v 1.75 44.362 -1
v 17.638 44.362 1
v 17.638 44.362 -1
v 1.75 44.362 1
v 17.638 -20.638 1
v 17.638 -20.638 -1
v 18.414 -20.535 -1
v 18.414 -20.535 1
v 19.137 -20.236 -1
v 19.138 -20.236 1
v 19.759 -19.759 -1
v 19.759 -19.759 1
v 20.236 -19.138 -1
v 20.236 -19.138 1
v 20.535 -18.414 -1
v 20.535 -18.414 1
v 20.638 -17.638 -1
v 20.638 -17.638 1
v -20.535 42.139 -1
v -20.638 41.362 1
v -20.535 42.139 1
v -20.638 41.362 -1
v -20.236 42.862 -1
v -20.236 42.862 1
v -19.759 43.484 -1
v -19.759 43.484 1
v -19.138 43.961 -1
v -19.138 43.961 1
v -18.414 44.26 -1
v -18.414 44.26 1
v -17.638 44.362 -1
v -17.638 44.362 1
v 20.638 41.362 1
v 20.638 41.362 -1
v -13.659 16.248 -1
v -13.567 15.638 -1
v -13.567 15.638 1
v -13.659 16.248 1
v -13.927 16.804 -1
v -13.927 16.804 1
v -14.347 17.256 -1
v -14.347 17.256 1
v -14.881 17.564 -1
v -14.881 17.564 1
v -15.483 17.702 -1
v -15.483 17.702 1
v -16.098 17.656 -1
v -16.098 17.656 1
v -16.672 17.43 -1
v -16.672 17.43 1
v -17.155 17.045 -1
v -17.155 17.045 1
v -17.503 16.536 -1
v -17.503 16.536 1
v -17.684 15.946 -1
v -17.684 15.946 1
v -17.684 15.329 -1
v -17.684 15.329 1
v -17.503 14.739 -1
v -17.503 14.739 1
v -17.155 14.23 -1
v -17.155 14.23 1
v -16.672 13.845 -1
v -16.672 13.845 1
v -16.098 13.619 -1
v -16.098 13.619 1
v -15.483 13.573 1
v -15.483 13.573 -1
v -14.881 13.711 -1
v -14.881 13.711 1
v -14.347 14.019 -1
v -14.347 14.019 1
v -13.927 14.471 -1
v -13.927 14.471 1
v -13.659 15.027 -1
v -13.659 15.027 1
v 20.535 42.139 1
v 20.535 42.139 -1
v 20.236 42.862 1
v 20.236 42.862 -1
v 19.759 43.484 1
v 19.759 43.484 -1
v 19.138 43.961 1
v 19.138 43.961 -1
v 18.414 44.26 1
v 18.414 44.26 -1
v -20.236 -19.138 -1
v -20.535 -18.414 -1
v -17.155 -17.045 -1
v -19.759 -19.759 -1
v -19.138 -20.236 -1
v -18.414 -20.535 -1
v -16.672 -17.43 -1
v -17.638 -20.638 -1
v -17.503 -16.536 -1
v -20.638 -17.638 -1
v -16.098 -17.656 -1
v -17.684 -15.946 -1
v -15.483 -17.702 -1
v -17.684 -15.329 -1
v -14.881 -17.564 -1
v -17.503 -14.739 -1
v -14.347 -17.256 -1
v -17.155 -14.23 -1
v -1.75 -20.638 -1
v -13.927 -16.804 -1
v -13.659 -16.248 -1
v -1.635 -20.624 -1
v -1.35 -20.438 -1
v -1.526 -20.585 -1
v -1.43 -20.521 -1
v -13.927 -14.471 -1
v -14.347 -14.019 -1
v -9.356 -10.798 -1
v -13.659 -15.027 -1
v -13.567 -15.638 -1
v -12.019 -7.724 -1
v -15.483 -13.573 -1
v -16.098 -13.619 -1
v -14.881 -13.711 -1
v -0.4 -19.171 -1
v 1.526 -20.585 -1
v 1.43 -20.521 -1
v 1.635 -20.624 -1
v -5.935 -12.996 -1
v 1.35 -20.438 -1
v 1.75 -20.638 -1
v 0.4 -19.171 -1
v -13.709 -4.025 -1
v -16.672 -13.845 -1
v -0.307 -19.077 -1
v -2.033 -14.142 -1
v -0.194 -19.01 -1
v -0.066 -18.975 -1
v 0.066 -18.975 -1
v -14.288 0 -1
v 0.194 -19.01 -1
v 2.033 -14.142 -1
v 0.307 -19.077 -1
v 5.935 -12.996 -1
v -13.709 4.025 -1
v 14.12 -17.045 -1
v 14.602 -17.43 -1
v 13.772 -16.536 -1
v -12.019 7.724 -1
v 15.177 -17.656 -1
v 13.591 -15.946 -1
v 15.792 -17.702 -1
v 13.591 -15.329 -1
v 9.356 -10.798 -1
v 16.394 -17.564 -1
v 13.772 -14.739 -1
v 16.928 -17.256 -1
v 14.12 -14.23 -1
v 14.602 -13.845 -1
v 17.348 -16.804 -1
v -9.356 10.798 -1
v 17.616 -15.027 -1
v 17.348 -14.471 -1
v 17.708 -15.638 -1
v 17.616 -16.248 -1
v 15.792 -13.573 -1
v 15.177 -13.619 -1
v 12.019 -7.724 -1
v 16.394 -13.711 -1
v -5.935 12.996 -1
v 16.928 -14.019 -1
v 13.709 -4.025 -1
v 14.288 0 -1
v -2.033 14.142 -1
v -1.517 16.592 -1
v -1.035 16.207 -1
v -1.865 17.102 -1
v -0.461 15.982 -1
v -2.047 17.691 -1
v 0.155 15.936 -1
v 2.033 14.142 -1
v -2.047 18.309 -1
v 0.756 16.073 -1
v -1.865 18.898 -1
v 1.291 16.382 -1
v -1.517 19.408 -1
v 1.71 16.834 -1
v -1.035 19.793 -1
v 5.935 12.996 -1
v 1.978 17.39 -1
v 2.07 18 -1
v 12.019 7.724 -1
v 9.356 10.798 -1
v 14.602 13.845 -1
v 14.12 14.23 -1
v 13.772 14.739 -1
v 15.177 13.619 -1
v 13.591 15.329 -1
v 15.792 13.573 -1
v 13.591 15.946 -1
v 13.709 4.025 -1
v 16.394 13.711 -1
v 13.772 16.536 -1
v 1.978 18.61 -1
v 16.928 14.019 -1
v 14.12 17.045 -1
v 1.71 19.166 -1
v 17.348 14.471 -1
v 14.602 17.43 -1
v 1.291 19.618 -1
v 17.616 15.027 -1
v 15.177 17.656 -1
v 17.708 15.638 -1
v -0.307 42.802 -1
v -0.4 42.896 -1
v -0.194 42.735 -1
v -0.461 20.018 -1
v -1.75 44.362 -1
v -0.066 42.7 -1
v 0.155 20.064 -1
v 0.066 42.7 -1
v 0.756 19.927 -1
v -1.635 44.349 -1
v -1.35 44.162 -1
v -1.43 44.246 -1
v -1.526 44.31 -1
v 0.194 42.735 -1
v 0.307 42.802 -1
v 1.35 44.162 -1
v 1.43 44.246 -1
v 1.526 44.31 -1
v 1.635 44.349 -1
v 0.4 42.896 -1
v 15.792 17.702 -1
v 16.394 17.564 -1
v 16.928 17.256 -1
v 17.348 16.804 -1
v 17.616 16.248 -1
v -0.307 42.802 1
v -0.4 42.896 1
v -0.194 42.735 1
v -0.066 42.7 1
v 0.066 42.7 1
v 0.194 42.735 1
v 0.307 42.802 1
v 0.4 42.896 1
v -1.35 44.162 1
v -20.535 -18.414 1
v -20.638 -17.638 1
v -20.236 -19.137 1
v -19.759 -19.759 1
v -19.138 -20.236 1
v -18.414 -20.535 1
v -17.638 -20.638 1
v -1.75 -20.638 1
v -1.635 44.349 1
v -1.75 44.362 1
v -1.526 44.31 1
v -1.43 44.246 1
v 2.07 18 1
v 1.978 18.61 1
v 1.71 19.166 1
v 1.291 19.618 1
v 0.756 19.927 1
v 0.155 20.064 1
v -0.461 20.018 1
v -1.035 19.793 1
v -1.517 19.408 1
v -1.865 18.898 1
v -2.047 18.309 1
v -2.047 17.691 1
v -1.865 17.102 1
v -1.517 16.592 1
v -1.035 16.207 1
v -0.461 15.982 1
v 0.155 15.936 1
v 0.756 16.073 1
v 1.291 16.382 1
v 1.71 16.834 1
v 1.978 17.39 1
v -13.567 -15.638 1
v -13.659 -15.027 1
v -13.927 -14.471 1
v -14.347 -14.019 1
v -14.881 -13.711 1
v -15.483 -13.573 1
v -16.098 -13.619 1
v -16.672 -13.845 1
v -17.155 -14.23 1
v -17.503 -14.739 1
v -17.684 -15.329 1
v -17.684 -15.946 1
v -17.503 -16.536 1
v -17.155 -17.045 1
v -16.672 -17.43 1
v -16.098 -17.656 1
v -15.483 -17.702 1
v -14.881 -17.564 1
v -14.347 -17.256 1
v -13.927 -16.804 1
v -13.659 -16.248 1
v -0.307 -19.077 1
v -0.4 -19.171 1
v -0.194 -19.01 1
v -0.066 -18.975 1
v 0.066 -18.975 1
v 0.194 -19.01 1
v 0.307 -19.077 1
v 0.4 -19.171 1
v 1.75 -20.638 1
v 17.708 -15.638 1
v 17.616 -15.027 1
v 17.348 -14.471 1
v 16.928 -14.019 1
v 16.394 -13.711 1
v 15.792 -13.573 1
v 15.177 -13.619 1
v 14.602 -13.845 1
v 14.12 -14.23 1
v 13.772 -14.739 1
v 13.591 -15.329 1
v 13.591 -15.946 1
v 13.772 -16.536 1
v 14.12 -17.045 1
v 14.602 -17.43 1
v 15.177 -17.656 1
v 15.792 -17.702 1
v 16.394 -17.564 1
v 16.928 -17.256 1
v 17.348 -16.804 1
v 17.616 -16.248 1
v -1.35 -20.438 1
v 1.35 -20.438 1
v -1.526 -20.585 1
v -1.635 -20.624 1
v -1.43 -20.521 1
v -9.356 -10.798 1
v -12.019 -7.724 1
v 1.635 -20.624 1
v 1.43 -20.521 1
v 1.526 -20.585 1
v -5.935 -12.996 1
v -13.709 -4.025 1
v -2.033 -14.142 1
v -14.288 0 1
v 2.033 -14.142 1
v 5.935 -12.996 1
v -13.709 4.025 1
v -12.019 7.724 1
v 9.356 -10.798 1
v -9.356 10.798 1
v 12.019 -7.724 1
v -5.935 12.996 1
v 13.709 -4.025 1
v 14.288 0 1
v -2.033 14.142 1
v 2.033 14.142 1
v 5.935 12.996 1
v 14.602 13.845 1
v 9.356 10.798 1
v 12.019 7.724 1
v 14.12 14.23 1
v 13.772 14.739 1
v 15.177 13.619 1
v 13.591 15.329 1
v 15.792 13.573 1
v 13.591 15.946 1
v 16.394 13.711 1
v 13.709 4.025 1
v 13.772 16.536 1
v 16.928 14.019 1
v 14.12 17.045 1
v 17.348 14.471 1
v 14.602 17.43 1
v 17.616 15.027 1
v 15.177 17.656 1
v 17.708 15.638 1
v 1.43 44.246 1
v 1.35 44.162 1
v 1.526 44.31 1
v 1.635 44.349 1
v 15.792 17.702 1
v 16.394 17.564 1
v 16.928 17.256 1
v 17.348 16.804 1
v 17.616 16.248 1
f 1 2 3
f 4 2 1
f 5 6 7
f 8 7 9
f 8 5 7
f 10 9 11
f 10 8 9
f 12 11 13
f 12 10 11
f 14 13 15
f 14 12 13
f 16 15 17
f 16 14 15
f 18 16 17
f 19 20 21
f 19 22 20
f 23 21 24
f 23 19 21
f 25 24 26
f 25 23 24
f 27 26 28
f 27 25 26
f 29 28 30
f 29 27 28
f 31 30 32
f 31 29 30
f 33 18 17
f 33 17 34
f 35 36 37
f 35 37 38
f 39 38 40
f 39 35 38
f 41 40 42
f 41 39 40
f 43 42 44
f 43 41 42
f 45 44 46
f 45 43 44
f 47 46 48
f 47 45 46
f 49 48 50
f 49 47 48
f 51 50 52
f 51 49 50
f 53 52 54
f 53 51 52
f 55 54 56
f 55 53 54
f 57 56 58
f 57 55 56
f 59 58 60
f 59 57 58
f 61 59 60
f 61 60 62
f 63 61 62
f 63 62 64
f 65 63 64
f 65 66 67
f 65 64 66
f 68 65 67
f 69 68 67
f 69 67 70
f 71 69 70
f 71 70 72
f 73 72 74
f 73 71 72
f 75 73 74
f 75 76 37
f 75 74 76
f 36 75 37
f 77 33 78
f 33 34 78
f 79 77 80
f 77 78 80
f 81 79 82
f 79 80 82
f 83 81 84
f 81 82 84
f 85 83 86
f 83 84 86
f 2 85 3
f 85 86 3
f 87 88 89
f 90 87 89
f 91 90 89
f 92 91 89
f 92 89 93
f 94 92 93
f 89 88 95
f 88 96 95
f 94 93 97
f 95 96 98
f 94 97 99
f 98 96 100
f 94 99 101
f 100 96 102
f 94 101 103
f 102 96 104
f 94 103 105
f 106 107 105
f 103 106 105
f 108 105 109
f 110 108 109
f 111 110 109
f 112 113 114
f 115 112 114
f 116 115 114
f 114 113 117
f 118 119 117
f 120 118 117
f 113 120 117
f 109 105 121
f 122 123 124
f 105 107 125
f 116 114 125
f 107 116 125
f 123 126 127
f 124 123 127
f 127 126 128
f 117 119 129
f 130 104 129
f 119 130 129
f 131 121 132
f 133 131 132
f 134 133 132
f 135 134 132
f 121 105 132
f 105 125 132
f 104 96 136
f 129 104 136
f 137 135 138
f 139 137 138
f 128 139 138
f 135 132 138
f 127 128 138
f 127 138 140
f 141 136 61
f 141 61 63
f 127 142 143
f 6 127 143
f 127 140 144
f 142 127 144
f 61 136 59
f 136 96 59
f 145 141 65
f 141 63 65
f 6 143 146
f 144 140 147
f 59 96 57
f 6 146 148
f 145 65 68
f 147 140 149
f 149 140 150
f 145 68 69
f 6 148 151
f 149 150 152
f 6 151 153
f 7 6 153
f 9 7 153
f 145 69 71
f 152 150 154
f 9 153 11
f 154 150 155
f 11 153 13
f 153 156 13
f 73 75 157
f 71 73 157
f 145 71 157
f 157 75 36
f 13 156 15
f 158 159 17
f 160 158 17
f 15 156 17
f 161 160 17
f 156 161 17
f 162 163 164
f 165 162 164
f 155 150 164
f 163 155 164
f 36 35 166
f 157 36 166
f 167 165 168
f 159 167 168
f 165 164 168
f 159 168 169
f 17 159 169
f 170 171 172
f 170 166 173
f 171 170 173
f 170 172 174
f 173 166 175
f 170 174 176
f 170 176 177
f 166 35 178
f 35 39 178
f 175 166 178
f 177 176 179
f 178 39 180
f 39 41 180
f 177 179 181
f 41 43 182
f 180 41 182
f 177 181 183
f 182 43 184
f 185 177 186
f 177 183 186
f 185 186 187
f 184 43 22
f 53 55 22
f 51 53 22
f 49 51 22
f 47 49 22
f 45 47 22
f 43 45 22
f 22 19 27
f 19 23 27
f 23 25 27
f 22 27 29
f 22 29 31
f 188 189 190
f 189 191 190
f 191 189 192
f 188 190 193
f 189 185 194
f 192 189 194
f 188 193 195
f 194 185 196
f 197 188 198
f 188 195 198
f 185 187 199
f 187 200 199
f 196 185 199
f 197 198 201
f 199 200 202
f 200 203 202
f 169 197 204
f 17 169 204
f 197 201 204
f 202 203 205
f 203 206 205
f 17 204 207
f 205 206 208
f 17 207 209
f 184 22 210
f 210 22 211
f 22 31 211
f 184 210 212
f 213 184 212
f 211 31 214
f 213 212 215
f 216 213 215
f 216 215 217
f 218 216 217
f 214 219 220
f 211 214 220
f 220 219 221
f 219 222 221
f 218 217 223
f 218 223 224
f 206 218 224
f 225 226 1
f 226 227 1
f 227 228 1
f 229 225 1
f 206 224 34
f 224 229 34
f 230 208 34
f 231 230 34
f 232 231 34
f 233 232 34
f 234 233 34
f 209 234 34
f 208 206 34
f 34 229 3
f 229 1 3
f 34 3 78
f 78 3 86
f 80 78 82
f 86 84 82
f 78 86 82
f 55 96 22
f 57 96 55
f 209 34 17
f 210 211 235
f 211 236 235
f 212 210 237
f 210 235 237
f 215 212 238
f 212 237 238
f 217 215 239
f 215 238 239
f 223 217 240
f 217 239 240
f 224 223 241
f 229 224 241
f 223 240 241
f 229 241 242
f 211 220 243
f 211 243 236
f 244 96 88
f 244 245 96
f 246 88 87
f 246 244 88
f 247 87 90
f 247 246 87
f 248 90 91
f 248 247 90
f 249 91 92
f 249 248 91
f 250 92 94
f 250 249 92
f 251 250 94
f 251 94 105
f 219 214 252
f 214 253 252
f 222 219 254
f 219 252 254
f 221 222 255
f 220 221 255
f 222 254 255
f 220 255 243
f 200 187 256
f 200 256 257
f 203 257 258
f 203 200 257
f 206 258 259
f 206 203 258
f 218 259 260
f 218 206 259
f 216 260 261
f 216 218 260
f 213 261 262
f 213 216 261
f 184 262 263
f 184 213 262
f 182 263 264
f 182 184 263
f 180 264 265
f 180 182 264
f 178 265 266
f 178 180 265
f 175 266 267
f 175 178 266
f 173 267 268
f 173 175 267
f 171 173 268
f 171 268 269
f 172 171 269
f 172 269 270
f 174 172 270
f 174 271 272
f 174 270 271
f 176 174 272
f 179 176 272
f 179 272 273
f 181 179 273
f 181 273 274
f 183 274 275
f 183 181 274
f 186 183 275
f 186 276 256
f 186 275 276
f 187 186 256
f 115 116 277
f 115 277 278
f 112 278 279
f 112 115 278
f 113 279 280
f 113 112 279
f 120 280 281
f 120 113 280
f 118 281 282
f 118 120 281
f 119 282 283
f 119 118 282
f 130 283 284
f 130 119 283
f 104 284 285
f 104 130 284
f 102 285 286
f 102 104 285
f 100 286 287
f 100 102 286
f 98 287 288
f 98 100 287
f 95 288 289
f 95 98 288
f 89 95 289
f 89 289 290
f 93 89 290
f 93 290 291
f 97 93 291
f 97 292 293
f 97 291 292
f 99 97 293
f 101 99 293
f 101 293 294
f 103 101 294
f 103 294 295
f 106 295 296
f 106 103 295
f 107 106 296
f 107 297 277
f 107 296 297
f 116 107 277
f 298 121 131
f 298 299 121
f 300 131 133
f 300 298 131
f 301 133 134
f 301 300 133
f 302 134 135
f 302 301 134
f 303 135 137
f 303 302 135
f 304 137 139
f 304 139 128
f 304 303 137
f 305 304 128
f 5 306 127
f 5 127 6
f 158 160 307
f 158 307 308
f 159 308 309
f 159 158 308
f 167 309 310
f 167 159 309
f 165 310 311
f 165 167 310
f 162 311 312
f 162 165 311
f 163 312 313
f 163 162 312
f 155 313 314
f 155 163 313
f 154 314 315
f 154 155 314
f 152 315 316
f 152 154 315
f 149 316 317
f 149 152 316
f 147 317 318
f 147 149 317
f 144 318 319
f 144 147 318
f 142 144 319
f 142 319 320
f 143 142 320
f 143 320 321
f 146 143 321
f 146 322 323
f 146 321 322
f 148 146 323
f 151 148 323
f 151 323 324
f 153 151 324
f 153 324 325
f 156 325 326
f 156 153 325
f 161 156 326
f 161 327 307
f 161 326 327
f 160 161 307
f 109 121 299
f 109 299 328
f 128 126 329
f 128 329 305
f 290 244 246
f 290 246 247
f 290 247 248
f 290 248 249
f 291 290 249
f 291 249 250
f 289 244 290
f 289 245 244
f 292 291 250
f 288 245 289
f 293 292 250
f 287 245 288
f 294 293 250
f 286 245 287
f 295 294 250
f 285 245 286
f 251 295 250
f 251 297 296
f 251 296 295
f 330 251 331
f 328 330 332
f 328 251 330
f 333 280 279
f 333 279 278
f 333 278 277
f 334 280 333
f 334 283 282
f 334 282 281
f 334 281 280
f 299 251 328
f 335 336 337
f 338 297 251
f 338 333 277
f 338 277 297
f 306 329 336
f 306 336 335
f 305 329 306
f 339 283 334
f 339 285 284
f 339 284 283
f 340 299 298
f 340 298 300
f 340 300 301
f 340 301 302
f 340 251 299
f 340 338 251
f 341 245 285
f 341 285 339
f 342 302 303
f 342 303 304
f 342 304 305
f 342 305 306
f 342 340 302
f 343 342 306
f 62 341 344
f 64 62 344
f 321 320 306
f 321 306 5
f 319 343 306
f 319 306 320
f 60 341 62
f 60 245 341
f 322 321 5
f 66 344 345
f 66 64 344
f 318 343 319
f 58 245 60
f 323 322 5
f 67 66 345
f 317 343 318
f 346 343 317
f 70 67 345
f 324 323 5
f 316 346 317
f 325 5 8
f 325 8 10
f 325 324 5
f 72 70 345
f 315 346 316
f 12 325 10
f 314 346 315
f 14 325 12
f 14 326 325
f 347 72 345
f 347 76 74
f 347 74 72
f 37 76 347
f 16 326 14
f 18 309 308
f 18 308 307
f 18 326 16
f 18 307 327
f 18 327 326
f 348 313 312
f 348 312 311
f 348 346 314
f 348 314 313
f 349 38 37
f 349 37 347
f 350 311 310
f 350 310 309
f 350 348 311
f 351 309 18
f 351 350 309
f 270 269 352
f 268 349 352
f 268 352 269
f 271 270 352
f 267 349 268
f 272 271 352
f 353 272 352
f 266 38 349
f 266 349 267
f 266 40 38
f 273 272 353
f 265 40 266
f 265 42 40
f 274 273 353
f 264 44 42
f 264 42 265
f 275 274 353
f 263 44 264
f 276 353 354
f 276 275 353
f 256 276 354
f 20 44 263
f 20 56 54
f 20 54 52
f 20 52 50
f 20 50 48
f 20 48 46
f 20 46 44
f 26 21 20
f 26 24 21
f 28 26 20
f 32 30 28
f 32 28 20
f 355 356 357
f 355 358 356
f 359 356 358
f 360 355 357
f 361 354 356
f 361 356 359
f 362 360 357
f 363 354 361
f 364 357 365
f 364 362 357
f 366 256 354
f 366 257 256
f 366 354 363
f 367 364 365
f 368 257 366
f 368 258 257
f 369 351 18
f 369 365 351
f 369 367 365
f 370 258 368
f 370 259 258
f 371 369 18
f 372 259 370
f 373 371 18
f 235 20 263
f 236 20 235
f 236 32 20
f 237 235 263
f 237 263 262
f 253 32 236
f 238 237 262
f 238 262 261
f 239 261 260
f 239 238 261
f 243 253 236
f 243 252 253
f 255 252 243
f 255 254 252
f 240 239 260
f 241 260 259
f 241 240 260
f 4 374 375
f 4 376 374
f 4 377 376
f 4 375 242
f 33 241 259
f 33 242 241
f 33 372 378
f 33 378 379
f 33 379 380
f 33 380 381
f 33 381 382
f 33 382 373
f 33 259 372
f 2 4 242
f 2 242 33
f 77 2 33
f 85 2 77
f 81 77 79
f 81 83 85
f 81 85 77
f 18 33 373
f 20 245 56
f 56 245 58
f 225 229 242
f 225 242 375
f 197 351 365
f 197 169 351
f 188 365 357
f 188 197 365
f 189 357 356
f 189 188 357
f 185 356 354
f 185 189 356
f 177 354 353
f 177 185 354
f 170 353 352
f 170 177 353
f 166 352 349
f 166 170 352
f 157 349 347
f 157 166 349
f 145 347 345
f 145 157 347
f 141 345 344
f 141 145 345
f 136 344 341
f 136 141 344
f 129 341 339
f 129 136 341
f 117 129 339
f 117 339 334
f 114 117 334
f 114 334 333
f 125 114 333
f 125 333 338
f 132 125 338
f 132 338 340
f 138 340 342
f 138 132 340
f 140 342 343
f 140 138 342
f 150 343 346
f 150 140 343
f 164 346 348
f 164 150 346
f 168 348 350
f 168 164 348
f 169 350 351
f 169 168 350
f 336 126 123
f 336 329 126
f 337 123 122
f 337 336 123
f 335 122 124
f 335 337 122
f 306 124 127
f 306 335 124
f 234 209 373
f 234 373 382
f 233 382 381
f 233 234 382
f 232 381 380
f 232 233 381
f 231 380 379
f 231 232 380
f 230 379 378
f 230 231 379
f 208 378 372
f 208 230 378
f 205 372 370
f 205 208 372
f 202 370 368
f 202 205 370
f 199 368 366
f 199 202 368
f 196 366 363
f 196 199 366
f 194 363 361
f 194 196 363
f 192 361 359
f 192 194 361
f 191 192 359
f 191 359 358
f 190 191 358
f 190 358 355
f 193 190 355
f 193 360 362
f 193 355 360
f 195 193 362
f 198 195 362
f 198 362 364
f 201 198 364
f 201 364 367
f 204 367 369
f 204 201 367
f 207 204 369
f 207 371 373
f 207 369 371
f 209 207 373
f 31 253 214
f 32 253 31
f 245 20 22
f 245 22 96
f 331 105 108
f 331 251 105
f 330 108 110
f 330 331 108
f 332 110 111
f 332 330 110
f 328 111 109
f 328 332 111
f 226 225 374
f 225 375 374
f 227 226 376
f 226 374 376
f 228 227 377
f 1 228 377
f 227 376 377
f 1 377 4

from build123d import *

# Parameters (mm, degrees)
SKETCH2_R               = 20.6375
SKETCH2_R_2             = 14.2875
BOSS_EXTRUDE1_DEPTH     = 1
CUT_EXTRUDE1_DEPTH      = 49.96874322
CUT_EXTRUDE1_DEPTH_BACK = 49.96874322
SKETCH3_R               = 2.07
FILLET1_R               = 3
FILLET3_R               = 0.5


with BuildPart() as part:
    # Sketch2 → Boss-Extrude1 (new, symmetric)
    # profile 1 of 4: a face of its own
    with BuildSketch(Plane.XY):
        Circle(SKETCH2_R)
        Circle(SKETCH2_R_2, mode=Mode.SUBTRACT)
    # profile 2 of 4: a face of its own
    with BuildSketch(Plane.XY):
        with BuildLine():
            Line((-20.6375, 44.3625), (-20.6375, 0))
            ThreePointArc((-20.6375, 0), (0, 20.6375), (20.6375, 0))
            Line((20.6375, 0), (20.6375, 44.3625))
            Line((20.6375, 44.3625), (-20.6375, 44.3625))
        make_face()
    # profile 3 of 4: a face of its own
    with BuildSketch(Plane.XY):
        with BuildLine():
            ThreePointArc((20.6375, 0), (14.592916166, -14.592916227), (-8.6e-08, -20.6375))
            Line((-8.6e-08, -20.6375), (20.6375, -20.6375))
            Line((20.6375, -20.6375), (20.6375, 0))
        make_face()
    # profile 4 of 4: a face of its own
    with BuildSketch(Plane.XY):
        with BuildLine():
            Line((-20.6375, 0), (-20.6375, -20.6375))
            Line((-20.6375, -20.6375), (-8.6e-08, -20.6375))
            ThreePointArc((-8.6e-08, -20.6375), (-14.592916227, -14.592916166), (-20.6375, 0))
        make_face()
    extrude(amount=BOSS_EXTRUDE1_DEPTH, both=True)

    # Sketch3 → Cut-Extrude1 (cut, two sides: drawn at the far end of the back side and taken through both)
    with BuildSketch(Plane.XY.offset(1).offset(-CUT_EXTRUDE1_DEPTH_BACK)):
        with Locations((0, 18)):
            Circle(SKETCH3_R)
        with Locations((-15.6375, -15.6375)):
            Circle(SKETCH3_R)
        with Locations((15.6375, -15.6375)):
            Circle(SKETCH3_R)
        with Locations((15.6375, 15.6375)):
            Circle(SKETCH3_R)
        with Locations((-15.6375, 15.6375)):
            Circle(SKETCH3_R)
        Polygon((0, 44.3625), (-1.5, 44.3625), (0, 42.3625), (1.5, 44.3625), align=None)
        Polygon((1.5, -20.6375), (0, -18.6375), (-1.5, -20.6375), (0, -20.6375), align=None)
    extrude(amount=CUT_EXTRUDE1_DEPTH + CUT_EXTRUDE1_DEPTH_BACK, mode=Mode.SUBTRACT)

    # Fillet1
    fillet1_edges = [part.edges().sort_by_distance(p)[0] for p in [
        (-20.6375, -20.6375, 0),
        (-20.6375, 44.3625, 0),
        (20.6375, 44.3625, 0),
        (20.6375, -20.6375, 0),
    ]]
    fillet(fillet1_edges, radius=FILLET1_R)

    # Fillet3
    fillet3_edges = [part.edges().sort_by_distance(p)[0] for p in [
        (1.5, -20.6375, 0),
        (-1.5, -20.6375, 0),
        (0, -18.6375, 0),
        (1.5, 44.3625, 0),
        (0, 42.3625, 0),
        (-1.5, 44.3625, 0),
    ]]
    fillet(fillet3_edges, radius=FILLET3_R)


solid = part.part
